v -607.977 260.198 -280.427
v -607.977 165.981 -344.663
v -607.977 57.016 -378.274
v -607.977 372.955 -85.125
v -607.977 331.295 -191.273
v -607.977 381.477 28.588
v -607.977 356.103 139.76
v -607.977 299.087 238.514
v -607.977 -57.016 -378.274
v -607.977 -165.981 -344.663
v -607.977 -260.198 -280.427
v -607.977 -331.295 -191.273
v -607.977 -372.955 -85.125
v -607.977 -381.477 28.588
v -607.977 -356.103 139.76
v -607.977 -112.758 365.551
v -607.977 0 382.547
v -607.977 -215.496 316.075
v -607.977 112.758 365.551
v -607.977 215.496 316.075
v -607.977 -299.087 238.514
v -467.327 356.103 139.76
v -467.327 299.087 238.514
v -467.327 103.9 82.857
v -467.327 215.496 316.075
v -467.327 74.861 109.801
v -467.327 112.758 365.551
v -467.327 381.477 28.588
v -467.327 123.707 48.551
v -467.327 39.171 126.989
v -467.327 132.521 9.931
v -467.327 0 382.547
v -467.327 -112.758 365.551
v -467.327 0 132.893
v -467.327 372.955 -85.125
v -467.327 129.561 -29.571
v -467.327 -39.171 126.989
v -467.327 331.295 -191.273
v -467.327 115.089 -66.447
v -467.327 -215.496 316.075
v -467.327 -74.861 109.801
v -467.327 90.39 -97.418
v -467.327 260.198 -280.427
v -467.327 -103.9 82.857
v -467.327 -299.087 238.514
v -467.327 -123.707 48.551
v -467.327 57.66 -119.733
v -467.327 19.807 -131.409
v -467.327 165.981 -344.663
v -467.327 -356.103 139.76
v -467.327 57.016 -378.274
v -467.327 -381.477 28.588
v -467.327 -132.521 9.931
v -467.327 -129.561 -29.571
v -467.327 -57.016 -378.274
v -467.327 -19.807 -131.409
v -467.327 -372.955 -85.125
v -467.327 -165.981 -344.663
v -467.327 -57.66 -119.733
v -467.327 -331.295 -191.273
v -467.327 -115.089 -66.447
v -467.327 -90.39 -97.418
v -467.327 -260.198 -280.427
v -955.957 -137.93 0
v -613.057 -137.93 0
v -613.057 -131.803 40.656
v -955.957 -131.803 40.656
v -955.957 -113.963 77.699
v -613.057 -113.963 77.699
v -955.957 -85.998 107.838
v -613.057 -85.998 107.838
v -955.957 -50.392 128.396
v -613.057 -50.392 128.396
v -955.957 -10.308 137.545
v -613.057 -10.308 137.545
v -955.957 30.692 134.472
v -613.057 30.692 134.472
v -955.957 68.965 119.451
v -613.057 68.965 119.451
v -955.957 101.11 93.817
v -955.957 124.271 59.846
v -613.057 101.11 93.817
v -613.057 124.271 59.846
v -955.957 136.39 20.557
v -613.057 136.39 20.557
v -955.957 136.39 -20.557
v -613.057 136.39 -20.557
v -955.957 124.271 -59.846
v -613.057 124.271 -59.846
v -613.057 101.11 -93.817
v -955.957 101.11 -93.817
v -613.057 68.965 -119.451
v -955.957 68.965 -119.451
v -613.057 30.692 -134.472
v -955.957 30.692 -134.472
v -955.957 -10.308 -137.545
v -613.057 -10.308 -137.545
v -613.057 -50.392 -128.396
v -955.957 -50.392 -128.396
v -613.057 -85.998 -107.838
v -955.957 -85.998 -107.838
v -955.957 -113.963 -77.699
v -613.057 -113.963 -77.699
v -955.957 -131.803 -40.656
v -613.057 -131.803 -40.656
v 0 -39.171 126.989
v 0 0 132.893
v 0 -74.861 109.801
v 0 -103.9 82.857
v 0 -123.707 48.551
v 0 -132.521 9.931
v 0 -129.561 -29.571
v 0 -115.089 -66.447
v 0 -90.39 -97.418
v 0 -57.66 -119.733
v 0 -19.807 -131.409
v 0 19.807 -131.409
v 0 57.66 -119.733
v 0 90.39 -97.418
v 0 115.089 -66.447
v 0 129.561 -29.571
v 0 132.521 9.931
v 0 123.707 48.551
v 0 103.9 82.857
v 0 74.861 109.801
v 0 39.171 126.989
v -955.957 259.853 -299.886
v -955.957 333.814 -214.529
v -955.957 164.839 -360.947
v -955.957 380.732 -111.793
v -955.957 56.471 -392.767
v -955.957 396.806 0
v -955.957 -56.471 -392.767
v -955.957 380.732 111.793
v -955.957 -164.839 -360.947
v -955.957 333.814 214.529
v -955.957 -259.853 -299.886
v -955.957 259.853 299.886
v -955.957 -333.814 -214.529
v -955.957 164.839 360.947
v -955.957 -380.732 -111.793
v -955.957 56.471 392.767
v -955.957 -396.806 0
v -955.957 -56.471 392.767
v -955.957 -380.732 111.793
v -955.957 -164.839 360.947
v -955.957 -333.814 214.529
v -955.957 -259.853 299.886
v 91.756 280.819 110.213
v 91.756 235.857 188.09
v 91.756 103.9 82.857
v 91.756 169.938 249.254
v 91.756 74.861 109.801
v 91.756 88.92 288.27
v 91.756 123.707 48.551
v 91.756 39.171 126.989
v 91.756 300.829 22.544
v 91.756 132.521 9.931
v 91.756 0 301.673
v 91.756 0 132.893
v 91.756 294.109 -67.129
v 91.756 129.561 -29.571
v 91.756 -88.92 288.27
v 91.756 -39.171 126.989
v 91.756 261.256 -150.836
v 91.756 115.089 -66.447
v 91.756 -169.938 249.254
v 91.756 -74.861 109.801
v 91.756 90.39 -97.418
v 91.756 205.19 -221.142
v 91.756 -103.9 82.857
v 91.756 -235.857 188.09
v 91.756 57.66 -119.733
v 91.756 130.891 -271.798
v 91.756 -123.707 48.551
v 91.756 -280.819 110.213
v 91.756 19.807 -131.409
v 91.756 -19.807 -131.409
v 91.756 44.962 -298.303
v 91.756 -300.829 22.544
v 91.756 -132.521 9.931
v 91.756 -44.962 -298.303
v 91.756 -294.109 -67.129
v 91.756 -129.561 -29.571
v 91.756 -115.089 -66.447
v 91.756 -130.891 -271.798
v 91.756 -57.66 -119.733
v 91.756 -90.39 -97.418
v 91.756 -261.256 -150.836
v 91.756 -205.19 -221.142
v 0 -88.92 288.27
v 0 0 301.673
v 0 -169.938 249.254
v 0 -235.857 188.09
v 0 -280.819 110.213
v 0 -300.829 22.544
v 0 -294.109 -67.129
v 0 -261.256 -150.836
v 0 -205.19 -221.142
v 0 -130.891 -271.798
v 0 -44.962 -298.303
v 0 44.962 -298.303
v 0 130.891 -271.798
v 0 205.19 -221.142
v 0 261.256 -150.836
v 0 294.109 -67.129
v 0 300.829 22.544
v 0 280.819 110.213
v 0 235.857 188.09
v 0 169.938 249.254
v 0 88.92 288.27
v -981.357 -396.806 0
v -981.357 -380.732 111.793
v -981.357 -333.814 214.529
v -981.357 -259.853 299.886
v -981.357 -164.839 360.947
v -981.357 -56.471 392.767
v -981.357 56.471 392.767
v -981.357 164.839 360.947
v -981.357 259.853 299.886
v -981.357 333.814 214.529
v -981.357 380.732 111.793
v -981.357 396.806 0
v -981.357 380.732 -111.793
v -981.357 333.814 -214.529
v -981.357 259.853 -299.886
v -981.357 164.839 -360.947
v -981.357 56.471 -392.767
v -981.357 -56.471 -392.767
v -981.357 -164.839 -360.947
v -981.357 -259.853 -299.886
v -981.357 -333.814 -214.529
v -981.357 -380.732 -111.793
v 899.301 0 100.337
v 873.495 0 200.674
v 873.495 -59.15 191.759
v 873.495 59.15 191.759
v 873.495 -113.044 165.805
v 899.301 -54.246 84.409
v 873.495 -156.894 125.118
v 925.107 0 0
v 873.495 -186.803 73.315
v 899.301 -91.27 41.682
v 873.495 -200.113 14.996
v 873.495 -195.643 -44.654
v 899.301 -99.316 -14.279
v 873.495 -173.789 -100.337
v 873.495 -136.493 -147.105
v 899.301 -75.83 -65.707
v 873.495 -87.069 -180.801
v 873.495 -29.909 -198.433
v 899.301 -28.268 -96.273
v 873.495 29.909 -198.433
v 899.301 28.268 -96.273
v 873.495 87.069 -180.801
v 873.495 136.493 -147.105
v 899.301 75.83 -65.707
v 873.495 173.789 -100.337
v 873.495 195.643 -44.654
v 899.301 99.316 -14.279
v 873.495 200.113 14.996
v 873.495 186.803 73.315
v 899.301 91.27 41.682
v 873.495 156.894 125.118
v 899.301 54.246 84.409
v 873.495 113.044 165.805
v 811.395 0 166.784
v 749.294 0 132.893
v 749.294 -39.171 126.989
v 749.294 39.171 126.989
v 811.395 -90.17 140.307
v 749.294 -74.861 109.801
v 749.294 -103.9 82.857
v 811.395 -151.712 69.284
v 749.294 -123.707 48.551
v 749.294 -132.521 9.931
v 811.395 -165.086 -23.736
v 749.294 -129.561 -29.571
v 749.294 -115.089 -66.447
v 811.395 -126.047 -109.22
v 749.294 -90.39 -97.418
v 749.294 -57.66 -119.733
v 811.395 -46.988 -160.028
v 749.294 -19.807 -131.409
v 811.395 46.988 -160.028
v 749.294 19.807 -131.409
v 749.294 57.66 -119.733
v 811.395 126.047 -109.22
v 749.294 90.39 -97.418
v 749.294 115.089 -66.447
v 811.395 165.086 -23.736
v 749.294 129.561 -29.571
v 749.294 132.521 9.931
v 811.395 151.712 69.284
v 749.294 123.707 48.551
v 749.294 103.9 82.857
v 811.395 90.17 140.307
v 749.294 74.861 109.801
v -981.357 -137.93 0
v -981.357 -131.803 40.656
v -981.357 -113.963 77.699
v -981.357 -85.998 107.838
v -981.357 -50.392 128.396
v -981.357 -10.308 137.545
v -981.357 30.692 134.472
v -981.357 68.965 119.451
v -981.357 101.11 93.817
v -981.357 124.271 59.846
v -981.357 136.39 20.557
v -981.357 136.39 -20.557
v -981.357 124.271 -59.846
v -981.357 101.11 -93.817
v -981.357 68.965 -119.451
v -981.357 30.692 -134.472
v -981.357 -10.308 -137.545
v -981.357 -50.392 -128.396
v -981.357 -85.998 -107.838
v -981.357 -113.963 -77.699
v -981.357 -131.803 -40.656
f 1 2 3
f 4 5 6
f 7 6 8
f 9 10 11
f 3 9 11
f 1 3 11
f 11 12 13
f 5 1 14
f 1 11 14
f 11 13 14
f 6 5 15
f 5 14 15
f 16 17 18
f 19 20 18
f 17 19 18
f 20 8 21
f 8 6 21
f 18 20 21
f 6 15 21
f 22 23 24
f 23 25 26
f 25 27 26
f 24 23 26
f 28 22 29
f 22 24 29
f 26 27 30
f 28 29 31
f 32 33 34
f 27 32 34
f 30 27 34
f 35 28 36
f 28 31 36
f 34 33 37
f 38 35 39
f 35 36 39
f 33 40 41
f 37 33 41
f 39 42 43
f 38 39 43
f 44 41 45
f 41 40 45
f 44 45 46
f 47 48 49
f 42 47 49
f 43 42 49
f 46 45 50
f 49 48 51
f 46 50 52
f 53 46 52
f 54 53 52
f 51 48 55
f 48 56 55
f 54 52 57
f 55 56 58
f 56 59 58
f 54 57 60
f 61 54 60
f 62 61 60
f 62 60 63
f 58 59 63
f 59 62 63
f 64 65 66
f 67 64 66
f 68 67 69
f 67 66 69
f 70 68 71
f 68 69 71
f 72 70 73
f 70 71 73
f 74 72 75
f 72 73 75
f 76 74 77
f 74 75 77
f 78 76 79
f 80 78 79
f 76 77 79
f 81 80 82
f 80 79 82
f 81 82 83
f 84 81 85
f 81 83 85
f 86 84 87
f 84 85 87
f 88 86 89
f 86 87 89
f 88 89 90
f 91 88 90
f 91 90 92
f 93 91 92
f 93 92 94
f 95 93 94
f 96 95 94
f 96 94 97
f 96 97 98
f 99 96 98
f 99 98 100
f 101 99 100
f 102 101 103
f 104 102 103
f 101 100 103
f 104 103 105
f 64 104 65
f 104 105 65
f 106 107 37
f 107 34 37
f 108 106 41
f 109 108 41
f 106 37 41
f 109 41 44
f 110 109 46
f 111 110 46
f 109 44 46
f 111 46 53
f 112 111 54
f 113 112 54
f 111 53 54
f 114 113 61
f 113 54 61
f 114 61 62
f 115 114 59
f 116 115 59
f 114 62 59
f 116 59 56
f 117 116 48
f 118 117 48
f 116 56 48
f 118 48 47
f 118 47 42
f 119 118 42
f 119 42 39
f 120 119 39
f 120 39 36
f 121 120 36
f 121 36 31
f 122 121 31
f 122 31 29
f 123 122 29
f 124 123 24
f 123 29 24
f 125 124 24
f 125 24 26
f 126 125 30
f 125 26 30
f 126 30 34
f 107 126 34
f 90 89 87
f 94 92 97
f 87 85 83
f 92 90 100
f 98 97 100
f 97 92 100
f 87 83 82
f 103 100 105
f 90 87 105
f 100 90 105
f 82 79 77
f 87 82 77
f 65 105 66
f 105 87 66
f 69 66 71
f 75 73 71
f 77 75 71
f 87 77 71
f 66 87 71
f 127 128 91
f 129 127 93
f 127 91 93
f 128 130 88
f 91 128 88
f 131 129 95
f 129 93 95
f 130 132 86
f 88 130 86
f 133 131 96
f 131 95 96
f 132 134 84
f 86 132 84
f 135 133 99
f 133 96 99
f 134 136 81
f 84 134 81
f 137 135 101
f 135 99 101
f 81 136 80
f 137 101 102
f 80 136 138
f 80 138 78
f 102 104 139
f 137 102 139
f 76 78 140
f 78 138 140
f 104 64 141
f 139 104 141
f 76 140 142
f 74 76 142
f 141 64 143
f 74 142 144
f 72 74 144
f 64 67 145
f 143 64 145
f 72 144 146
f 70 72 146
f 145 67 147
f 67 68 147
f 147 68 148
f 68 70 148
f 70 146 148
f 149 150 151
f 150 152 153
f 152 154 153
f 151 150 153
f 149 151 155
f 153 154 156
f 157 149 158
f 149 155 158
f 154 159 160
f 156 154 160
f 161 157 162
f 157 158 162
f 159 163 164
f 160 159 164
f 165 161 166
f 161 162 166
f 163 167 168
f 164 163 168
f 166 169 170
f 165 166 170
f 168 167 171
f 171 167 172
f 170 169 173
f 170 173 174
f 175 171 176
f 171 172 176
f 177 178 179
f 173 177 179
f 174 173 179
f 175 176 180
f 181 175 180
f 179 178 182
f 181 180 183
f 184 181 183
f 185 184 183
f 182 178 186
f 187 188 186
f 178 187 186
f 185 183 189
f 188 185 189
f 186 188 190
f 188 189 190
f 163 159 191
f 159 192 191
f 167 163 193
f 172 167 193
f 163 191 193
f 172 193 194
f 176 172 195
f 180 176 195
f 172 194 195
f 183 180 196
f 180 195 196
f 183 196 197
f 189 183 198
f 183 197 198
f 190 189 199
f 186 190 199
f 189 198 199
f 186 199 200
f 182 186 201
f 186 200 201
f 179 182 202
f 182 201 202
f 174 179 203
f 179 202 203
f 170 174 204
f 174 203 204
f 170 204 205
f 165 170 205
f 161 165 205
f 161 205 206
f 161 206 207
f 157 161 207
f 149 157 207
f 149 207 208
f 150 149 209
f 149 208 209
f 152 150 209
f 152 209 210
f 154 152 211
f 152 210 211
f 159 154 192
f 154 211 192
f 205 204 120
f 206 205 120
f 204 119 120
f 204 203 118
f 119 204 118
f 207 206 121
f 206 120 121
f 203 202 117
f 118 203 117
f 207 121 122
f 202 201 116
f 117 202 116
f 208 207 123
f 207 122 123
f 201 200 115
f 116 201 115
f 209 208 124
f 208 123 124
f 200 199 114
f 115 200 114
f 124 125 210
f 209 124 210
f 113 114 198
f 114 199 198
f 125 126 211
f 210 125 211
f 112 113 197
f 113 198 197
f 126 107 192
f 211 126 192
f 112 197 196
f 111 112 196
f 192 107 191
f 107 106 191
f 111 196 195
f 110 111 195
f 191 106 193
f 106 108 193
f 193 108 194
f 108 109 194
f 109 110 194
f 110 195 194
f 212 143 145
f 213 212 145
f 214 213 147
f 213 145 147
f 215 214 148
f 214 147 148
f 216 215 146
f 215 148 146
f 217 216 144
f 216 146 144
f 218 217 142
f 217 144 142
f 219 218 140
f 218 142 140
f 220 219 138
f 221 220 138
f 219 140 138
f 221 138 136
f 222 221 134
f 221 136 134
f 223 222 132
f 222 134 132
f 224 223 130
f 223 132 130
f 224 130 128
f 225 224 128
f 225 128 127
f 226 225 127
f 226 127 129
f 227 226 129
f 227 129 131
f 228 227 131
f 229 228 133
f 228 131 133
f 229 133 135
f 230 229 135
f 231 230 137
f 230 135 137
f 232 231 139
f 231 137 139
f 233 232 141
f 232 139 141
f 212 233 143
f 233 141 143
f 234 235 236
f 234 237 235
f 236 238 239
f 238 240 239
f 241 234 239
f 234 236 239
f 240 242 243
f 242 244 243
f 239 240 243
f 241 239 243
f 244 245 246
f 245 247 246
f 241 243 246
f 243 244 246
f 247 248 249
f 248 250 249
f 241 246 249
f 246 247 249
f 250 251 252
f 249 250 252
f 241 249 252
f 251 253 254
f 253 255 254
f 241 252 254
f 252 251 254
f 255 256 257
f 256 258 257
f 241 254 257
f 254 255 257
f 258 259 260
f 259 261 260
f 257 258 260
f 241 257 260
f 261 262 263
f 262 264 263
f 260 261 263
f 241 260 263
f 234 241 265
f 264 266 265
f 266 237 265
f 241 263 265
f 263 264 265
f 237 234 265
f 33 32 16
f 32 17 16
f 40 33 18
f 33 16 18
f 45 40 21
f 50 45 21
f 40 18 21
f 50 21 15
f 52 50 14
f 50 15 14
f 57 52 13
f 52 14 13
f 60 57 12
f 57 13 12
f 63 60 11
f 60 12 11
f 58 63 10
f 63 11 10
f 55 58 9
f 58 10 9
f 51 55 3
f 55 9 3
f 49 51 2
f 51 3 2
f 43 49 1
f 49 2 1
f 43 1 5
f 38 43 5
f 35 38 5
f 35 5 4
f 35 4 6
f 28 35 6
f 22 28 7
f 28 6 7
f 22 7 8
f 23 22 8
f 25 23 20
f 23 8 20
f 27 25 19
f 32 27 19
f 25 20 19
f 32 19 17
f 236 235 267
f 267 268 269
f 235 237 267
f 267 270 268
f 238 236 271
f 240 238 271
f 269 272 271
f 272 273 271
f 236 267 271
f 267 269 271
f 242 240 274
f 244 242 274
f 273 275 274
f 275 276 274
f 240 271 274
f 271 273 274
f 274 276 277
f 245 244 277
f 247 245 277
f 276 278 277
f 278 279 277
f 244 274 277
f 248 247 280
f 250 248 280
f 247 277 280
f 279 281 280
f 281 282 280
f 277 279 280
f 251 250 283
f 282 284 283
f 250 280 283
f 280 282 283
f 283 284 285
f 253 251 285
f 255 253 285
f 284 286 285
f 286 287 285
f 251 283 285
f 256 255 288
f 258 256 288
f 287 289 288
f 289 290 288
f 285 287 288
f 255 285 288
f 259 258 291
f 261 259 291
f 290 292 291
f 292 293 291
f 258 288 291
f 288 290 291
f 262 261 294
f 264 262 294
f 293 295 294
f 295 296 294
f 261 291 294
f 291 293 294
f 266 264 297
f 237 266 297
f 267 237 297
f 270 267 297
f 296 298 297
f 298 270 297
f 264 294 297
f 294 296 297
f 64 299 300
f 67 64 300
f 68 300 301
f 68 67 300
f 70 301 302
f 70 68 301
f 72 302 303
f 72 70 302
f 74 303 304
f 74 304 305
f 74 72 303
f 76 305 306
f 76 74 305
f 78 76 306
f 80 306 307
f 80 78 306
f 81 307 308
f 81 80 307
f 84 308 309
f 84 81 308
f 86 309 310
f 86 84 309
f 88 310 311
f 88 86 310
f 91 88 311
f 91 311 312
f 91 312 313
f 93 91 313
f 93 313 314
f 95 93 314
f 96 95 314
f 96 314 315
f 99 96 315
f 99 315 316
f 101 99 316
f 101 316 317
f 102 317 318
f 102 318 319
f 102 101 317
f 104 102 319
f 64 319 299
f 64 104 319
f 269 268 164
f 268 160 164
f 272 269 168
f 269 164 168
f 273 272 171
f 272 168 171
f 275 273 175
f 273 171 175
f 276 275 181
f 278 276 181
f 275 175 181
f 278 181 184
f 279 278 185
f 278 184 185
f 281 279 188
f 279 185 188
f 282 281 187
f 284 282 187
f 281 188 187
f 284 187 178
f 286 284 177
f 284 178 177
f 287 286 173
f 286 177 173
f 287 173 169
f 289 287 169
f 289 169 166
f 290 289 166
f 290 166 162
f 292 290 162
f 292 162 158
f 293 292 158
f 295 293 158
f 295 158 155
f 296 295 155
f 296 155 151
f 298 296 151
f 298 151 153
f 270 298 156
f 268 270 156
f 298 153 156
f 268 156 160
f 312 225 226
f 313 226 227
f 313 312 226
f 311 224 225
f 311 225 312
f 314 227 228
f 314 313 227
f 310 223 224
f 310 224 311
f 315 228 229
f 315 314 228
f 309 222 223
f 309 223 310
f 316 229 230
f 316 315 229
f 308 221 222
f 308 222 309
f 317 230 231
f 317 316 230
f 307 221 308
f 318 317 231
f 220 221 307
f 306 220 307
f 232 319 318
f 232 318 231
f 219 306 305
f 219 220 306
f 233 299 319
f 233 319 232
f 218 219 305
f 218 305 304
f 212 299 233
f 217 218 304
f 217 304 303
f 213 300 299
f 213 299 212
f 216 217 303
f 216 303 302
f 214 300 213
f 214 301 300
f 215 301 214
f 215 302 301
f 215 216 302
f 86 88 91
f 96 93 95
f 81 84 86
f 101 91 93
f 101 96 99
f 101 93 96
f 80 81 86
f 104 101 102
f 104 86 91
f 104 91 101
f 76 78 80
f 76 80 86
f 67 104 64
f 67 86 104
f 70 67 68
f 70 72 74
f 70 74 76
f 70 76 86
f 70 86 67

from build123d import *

# Parameters (mm, degrees)
F3_START = 5.08
F2_R     = 137.9304281911
F3_DEPTH = 342.9
F4_R     = 396.8058928466
F4_R_2   = 137.9304281911
F5_DEPTH = 25.4


with BuildPart() as f1:
    # F0 (on Front) → F1 (revolve)
    with BuildSketch(Plane.XZ):
        Polygon((-607.9770922661, 382.5466036797), (-607.9770922661, 0), (925.1065850258, 0), (873.4953469969, 200.6744790645), (749.2942214012, 132.8930705786), (91.7560905218, 132.8930705786), (91.7560905218, 301.6729056835), (0, 301.6729056835), (0, 132.8930705786), (-467.3272073269, 132.8930705786), (-467.3272073269, 382.5466036797), align=None)
    revolve(axis=Axis((158.5647463799, 0, 0), (1, 0, 0)))


with BuildPart() as f3:
    # F2 (on face) → F3 (new body)
    with BuildSketch(Plane(origin=(-607.9770922661, 0, 0), x_dir=(0, -1, 0), z_dir=(-1, 0, 0)).offset(F3_START)):
        Circle(F2_R)
    extrude(amount=F3_DEPTH)


with BuildPart() as f5:
    # F4 (on face) → F5 (new body)
    with BuildSketch(Plane(origin=(-955.9570922661, 0, 0), x_dir=(0, -1, 0), z_dir=(-1, 0, 0))):
        Circle(F4_R)
        Circle(F4_R_2, mode=Mode.SUBTRACT)
    extrude(amount=F5_DEPTH)


solid = Compound([f1.part, f3.part, f5.part])
